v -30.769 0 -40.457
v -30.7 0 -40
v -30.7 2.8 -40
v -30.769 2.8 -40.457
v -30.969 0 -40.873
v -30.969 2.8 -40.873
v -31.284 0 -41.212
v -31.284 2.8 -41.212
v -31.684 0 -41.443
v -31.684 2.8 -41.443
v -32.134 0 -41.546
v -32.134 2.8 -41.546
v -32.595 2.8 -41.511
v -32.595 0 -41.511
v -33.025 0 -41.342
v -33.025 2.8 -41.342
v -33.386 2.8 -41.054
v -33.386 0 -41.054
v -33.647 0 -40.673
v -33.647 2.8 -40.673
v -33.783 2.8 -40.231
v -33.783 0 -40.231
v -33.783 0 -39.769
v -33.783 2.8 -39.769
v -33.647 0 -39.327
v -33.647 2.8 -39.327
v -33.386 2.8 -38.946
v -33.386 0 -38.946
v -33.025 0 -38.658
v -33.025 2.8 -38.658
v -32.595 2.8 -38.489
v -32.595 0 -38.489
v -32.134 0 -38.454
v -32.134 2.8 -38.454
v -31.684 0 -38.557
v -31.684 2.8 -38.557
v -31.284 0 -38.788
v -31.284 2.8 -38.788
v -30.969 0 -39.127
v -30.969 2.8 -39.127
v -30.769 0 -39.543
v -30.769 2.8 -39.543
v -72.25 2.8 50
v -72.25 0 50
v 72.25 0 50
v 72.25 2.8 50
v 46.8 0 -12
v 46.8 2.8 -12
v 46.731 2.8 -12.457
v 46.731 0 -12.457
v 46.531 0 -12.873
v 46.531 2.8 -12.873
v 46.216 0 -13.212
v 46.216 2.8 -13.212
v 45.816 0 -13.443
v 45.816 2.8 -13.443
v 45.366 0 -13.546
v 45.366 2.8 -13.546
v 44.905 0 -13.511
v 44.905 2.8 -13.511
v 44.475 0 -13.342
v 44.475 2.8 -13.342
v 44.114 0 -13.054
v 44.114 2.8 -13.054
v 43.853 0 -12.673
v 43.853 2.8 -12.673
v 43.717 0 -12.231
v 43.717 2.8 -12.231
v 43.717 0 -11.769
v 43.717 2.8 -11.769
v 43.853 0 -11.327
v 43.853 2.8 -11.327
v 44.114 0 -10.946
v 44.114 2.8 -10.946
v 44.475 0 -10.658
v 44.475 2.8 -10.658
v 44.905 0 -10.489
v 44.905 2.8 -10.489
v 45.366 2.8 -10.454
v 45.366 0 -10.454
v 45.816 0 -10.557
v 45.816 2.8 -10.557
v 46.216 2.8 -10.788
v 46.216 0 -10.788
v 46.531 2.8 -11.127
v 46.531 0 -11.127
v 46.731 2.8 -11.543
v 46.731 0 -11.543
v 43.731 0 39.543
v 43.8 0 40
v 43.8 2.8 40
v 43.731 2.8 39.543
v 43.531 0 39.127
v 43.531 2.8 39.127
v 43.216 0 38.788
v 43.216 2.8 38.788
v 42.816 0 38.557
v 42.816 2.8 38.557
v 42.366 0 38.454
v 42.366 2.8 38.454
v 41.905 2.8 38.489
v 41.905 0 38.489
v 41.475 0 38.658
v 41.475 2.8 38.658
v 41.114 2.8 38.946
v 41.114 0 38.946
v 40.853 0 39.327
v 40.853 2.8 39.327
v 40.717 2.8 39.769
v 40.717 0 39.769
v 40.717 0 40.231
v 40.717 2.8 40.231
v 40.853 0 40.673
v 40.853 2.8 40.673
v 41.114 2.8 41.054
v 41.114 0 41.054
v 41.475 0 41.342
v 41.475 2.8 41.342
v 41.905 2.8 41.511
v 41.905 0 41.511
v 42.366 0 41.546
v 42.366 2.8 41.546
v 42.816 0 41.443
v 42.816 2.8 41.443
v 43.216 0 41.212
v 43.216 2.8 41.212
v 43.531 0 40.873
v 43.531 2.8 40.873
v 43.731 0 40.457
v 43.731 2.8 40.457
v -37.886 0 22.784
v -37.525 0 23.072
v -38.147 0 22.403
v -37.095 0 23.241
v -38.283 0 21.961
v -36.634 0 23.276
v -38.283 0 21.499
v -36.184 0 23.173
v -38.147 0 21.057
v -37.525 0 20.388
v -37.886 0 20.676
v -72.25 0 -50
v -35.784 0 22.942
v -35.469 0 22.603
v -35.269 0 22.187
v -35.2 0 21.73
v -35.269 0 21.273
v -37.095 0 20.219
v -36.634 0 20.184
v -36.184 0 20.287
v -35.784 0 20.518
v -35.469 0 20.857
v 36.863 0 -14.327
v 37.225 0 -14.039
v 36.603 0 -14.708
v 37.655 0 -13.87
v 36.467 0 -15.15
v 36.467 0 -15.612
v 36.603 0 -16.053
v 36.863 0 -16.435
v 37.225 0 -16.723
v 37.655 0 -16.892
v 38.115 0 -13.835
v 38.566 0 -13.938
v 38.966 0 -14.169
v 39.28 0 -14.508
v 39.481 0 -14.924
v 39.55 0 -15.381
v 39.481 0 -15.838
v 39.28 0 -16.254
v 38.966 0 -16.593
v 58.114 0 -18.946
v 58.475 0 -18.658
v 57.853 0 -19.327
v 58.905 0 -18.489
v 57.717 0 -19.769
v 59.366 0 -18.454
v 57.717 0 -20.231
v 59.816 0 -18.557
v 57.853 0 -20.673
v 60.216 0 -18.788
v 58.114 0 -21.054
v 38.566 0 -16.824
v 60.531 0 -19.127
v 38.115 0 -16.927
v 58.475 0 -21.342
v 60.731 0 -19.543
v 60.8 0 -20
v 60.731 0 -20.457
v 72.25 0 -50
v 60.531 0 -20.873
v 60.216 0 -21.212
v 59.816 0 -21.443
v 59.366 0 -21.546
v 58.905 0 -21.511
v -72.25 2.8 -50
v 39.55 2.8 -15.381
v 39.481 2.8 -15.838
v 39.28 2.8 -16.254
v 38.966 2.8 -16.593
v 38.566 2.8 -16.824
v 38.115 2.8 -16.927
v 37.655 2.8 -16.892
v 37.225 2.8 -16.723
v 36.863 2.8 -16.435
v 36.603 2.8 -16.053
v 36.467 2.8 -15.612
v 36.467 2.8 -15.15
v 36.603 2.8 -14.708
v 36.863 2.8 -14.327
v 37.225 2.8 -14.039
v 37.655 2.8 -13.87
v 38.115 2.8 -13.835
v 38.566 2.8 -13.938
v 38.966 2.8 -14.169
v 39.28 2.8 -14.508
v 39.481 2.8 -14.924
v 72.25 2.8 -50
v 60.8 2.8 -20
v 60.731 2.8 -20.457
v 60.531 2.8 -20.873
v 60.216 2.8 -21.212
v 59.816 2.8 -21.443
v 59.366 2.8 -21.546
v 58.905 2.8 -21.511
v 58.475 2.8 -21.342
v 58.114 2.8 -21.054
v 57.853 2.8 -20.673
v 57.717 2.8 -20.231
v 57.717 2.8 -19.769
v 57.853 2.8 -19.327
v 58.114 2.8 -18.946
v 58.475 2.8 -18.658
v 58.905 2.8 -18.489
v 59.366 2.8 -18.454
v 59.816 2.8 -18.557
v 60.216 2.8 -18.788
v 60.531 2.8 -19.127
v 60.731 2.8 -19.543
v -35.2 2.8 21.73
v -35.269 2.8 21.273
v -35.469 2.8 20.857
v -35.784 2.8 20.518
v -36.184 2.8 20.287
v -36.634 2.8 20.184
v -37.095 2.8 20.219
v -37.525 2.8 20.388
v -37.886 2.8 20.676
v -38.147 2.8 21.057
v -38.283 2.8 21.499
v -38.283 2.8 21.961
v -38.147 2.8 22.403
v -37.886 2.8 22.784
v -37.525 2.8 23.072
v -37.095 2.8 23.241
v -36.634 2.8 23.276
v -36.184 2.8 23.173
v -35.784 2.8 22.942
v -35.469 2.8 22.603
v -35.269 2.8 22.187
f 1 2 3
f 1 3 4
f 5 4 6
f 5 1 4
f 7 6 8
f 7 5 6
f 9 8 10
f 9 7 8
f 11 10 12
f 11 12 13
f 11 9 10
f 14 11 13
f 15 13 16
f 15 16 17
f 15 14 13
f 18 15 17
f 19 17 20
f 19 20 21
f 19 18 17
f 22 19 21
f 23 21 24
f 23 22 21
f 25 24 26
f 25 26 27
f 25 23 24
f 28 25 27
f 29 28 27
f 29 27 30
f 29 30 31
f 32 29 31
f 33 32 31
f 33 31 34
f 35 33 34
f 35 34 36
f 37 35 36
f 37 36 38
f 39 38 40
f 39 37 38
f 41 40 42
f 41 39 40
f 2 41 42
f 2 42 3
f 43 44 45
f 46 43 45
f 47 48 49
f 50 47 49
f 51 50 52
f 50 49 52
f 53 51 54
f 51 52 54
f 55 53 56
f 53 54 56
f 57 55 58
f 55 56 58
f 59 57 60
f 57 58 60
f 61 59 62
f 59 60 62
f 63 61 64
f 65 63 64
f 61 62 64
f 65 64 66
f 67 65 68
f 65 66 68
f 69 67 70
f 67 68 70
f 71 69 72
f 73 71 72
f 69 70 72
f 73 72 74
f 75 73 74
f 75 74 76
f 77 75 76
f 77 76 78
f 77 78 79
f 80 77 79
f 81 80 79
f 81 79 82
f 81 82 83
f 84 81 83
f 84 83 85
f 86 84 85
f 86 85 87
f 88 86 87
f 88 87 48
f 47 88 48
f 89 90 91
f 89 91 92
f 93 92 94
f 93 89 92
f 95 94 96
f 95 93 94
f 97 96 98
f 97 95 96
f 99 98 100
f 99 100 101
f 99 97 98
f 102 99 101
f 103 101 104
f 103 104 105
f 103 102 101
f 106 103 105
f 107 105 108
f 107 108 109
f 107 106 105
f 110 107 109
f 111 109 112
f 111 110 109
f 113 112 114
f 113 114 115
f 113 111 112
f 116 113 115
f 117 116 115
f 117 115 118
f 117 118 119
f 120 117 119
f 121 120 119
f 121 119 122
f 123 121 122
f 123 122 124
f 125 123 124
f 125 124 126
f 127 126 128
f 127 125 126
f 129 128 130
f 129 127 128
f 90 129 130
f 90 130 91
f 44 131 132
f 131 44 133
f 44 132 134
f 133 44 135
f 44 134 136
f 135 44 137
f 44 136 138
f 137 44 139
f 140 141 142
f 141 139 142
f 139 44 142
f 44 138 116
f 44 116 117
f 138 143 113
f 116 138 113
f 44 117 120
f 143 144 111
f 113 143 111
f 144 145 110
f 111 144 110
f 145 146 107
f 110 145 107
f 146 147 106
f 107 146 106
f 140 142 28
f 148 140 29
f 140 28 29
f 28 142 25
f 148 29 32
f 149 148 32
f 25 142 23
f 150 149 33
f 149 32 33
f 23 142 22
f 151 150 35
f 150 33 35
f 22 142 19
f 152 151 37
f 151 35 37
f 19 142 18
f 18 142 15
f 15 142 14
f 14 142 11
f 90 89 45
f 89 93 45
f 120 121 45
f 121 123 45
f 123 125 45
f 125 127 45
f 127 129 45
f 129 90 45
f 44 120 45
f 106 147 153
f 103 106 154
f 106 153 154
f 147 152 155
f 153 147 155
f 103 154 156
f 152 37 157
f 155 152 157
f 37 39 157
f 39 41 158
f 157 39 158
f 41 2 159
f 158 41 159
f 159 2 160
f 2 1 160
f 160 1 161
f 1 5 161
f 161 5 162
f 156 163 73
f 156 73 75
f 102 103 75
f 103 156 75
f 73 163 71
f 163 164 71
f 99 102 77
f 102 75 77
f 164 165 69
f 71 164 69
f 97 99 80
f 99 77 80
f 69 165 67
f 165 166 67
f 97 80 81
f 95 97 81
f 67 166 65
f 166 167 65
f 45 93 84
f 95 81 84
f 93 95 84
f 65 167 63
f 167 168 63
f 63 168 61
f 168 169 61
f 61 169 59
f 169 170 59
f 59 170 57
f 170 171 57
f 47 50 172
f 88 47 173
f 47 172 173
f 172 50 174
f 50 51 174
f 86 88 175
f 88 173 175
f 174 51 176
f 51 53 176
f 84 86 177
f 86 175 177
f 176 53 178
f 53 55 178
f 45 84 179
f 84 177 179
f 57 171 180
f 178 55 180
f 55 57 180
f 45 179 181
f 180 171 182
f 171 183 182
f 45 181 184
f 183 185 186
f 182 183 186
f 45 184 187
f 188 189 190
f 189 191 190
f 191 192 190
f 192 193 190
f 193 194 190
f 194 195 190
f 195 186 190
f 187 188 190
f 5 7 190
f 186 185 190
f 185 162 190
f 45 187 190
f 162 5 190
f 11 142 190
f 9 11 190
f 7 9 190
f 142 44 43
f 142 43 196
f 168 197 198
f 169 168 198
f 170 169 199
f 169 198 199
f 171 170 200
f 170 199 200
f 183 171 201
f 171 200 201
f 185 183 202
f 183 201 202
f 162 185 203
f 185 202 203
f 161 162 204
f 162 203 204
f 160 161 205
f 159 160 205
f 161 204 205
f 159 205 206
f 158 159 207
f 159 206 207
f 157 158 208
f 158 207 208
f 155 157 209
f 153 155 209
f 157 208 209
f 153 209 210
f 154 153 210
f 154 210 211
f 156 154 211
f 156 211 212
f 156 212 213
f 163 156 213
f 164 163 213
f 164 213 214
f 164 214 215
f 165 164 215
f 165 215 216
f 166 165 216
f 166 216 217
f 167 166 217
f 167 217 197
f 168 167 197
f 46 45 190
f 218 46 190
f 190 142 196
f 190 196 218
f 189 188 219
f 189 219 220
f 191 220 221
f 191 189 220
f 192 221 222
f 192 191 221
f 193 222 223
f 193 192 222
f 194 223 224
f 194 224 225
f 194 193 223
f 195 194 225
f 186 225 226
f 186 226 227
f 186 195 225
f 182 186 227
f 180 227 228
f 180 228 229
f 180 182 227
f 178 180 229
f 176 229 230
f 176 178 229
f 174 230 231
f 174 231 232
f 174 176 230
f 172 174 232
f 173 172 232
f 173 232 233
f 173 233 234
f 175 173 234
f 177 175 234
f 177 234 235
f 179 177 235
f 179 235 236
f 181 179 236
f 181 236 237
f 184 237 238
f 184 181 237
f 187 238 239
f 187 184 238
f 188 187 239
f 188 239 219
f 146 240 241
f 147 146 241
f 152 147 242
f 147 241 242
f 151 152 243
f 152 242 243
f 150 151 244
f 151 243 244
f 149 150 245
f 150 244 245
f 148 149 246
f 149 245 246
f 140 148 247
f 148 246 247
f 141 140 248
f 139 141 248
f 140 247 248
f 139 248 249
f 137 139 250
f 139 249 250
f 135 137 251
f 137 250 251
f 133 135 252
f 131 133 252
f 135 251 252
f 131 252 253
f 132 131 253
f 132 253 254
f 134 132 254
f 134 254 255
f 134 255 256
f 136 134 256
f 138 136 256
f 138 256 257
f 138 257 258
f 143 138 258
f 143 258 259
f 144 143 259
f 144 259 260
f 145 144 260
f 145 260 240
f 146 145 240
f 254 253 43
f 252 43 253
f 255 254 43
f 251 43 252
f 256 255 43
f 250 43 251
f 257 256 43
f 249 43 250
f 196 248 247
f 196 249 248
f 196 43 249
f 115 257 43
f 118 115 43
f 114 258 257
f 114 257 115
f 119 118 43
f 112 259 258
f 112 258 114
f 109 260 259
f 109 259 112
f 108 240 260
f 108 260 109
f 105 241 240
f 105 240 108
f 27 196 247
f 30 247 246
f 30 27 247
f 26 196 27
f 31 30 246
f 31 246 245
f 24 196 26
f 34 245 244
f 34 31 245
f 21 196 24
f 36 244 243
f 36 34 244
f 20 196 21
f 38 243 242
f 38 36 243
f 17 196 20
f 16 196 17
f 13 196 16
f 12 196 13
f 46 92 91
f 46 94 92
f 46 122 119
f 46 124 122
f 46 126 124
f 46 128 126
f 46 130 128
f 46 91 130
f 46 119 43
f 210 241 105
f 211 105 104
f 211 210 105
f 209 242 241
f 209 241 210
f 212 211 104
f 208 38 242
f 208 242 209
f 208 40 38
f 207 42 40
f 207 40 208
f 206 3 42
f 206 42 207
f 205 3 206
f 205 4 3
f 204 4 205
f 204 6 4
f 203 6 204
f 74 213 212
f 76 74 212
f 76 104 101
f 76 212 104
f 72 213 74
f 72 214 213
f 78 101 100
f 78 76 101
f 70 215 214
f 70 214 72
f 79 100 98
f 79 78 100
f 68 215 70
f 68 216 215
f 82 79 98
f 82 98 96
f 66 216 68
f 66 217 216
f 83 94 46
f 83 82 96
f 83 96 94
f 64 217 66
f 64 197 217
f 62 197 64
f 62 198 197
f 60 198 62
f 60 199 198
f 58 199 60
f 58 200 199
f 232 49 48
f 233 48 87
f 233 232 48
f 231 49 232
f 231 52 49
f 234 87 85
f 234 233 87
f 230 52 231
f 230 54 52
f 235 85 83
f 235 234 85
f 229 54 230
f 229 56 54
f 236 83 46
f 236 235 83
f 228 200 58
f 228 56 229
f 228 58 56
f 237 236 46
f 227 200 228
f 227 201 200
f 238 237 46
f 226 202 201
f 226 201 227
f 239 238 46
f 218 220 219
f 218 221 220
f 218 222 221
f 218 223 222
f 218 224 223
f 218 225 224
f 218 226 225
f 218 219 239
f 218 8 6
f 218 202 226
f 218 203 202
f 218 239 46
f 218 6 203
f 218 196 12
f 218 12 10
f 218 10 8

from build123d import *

# Parameters (mm, degrees)
SKETCH1_W           = 144.5
SKETCH1_H           = 100
SKETCH1_R           = 1.55
BOSS_EXTRUDE1_DEPTH = 2.8
CUT_EXTRUDE1_REACH  = 4.8
SKETCH2_R           = 1.55
CUT_EXTRUDE2_REACH  = 4.8
SKETCH3_R           = 1.55


with BuildPart() as part:
    # Sketch1 → Boss-Extrude1 (new body)
    with BuildSketch(Plane(origin=(0, 0, 0), x_dir=(1, 0, 0), z_dir=(0, 1, 0))):
        Rectangle(SKETCH1_W, SKETCH1_H)
        with Locations((-32.25, 40)):
            Circle(SKETCH1_R, mode=Mode.SUBTRACT)
        with Locations((59.25, 20)):
            Circle(SKETCH1_R, mode=Mode.SUBTRACT)
        with Locations((42.25, -40)):
            Circle(SKETCH1_R, mode=Mode.SUBTRACT)
    extrude(amount=BOSS_EXTRUDE1_DEPTH)

    # Sketch2 → Cut-Extrude1 (cut, up to next)
    with BuildSketch(Plane(origin=(0, 2.8, 0), x_dir=(1, 0, 0), z_dir=(0, 1, 0)), mode=Mode.PRIVATE) as cut_extrude1_sk1:
        with Locations((-36.75, -21.73)):
            Circle(SKETCH2_R)
    cut_extrude1_tool1 = extrude(cut_extrude1_sk1.sketch, amount=-CUT_EXTRUDE1_REACH, mode=Mode.PRIVATE) & part.part
    add(cut_extrude1_tool1.solids().sort_by_distance((-36.75, 2.8, 21.73))[0], mode=Mode.SUBTRACT)

    # Sketch3 → Cut-Extrude2 (cut, up to next)
    with BuildSketch(Plane(origin=(0, 2.8, 0), x_dir=(1, 0, 0), z_dir=(0, 1, 0)), mode=Mode.PRIVATE) as cut_extrude2_sk1:
        with Locations((37.999537704, 15.380946094)):
            Circle(SKETCH3_R)
    cut_extrude2_tool1 = extrude(cut_extrude2_sk1.sketch, amount=-CUT_EXTRUDE2_REACH, mode=Mode.PRIVATE) & part.part
    add(cut_extrude2_tool1.solids().sort_by_distance((37.999538, 2.8, -15.380946))[0], mode=Mode.SUBTRACT)
    # Sketch3 → Cut-Extrude2 (cut, up to next)
    with BuildSketch(Plane(origin=(0, 2.8, 0), x_dir=(1, 0, 0), z_dir=(0, 1, 0)), mode=Mode.PRIVATE) as cut_extrude2_sk2:
        with Locations((45.25, 12)):
            Circle(SKETCH3_R)
    cut_extrude2_tool2 = extrude(cut_extrude2_sk2.sketch, amount=-CUT_EXTRUDE2_REACH, mode=Mode.PRIVATE) & part.part
    add(cut_extrude2_tool2.solids().sort_by_distance((45.25, 2.8, -12))[0], mode=Mode.SUBTRACT)


solid = part.part
